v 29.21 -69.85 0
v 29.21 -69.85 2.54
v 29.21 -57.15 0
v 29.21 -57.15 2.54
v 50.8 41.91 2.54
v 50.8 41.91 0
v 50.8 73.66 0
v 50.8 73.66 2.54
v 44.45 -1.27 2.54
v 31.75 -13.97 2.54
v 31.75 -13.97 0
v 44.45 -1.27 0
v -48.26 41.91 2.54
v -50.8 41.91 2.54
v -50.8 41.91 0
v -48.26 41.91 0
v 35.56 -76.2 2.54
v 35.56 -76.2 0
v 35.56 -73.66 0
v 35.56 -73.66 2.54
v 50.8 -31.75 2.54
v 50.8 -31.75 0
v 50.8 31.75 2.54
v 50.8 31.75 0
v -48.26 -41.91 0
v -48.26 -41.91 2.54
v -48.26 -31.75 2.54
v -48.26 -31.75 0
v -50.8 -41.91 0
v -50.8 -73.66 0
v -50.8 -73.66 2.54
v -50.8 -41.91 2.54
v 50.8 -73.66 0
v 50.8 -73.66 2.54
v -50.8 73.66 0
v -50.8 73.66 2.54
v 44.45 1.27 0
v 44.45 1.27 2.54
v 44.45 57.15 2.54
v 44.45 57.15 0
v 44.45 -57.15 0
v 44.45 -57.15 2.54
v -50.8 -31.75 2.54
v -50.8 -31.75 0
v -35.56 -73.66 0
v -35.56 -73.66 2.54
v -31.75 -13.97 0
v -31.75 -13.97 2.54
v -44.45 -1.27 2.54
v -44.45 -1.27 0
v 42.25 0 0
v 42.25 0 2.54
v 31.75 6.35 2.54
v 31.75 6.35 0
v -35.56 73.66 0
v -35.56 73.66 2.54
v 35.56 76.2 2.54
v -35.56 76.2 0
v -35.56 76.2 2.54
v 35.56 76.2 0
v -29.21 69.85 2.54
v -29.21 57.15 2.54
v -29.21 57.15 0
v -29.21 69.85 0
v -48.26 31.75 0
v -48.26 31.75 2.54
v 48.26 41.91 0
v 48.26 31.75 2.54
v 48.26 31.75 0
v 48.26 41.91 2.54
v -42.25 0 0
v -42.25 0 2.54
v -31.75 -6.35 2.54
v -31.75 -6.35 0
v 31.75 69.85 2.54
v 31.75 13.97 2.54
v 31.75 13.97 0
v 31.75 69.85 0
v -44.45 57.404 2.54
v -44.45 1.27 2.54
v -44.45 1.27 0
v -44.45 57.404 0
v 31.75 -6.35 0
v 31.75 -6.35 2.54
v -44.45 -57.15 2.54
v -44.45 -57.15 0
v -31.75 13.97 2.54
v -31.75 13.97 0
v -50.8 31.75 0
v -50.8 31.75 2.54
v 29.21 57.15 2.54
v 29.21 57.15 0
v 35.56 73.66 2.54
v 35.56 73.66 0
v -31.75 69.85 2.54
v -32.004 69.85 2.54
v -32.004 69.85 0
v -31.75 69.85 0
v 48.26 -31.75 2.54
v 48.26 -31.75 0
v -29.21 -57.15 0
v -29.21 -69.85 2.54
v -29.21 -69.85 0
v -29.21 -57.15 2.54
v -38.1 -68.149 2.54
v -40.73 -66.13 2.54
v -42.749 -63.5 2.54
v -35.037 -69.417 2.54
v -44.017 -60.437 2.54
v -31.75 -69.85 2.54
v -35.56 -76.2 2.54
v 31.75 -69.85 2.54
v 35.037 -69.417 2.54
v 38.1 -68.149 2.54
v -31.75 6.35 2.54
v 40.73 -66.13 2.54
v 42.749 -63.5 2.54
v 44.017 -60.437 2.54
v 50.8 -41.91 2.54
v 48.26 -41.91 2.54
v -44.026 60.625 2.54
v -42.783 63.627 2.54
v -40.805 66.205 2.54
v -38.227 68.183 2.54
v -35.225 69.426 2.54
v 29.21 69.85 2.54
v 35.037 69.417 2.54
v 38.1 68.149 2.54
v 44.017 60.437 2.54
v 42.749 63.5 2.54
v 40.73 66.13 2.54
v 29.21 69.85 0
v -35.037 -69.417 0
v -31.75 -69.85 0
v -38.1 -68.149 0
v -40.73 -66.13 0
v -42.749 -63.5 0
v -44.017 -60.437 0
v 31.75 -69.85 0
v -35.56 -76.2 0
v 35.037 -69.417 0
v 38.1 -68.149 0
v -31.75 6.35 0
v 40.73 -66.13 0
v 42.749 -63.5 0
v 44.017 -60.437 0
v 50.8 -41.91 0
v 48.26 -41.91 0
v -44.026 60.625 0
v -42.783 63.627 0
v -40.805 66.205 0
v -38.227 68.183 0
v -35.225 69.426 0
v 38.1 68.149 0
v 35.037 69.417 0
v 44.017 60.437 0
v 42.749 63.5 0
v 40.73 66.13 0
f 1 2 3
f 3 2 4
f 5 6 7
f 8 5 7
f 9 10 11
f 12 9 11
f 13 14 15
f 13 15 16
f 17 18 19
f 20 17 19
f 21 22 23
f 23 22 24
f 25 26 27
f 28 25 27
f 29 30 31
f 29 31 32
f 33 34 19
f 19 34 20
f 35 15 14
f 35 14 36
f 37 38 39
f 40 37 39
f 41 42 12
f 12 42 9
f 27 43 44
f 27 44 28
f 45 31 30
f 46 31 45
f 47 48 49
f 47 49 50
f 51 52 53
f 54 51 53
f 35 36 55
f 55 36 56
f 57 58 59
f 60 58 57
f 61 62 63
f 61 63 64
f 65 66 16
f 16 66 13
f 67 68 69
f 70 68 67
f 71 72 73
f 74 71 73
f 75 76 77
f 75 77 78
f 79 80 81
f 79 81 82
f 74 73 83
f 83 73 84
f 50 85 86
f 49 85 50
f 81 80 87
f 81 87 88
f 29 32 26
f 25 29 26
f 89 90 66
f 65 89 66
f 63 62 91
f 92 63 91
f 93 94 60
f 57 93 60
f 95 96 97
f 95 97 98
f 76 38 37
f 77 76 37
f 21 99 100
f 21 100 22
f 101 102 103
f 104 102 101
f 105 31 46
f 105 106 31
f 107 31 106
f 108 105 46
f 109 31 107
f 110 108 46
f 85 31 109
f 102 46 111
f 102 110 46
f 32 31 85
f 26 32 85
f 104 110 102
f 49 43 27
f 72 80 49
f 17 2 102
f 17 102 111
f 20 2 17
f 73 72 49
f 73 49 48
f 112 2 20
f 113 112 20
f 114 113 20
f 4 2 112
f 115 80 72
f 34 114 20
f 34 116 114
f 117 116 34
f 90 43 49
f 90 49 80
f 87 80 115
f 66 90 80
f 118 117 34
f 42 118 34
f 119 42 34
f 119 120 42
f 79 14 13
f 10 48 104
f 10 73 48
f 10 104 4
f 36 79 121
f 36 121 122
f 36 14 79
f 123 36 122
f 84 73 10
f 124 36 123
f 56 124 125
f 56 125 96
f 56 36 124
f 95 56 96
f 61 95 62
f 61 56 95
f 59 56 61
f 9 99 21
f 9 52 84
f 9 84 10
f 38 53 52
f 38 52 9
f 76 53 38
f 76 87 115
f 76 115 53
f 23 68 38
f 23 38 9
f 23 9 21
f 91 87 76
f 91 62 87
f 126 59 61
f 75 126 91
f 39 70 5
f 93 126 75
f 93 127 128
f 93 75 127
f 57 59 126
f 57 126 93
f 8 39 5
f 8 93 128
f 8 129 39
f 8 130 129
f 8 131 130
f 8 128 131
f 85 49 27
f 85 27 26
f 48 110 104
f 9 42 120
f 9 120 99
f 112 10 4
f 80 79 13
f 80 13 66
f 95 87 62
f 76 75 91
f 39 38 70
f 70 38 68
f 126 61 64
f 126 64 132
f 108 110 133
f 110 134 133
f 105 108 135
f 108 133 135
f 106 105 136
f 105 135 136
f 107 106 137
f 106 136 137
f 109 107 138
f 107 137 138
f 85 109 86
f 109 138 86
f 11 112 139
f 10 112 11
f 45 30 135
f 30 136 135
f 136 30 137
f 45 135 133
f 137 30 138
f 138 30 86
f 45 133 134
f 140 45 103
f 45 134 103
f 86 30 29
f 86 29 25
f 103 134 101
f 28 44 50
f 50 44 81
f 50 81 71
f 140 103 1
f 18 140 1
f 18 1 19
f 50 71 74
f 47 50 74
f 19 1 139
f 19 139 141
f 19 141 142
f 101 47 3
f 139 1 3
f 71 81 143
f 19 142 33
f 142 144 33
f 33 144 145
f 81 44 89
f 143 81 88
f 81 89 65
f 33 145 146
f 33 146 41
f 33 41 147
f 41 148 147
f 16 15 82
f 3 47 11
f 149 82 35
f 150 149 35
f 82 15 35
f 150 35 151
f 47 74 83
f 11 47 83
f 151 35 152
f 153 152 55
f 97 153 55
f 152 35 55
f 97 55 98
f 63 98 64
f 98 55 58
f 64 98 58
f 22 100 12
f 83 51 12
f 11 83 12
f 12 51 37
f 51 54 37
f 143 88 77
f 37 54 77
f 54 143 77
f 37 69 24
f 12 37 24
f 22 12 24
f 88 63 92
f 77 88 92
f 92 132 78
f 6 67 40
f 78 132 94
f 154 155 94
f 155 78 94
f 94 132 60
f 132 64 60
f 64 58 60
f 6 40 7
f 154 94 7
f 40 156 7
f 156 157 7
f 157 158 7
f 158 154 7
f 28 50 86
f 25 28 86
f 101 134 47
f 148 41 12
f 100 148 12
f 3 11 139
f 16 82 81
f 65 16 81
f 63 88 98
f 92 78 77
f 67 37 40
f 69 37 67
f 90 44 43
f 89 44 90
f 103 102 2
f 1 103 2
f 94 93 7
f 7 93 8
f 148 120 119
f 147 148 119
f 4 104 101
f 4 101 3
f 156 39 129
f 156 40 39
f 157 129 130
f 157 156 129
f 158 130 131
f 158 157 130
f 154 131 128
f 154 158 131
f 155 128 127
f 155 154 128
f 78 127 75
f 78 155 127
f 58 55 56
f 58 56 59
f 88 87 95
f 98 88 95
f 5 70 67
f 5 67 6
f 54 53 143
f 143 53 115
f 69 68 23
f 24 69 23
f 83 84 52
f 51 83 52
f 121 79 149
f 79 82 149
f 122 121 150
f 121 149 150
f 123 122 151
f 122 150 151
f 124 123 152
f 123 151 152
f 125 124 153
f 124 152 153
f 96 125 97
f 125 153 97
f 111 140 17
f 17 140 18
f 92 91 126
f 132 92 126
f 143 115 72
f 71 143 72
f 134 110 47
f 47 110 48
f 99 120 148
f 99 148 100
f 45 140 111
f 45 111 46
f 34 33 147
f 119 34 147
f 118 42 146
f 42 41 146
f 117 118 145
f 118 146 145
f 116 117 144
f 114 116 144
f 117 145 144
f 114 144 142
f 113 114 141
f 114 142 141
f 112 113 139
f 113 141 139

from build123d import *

# Parameters (mm, degrees)
F0_W      = 101.6
F0_H      = 152.4
F1_DEPTH  = 2.54
F2_W      = 12.7
F2_H      = 68.58
F3_DEPTH  = 2.541
F4_SIZE2  = 12.69999
F4_SIZE   = 12.69999
F5_R      = 12.446
F6_W      = 58.42
F6_H      = 12.7
F7_DEPTH  = 2.541
F8_W      = 12.7
F8_H      = 68.58
F9_DEPTH  = 2.541
F10_R     = 12.69999
F11_SIZE2 = 12.69999
F11_SIZE  = 12.69999
F12_W     = 12.7
F12_H     = 68.58
F13_DEPTH = 2.541
F14_SIZE2 = 12.69999
F14_SIZE  = 12.69999
F15_R     = 12.69999
F16_W     = 12.7
F16_H     = 68.58
F17_DEPTH = 2.541
F18_SIZE2 = 12.69999
F18_SIZE  = 12.69999
F19_R     = 12.69999
F20_W     = 58.42
F20_H     = 12.7
F21_DEPTH = 2.541
F23_DEPTH = 25.4
F25_DEPTH = 25.4
F27_DEPTH = 25.4
F28_W     = 2.54
F28_H     = 10.16
F29_DEPTH = 25.4
F30_W     = 2.54
F30_H     = 10.16
F31_DEPTH = 25.4
F32_W     = 15.24
F32_H     = 2.54
F33_DEPTH = 25.4


# Not quite as in the source:
# - a fillet or chamfer is up to 0.001 mm smaller than in the source, because OpenCascade refuses the exact size


with BuildPart() as f1:
    # F0 (on Top) → F1 (new body)
    with BuildSketch(Plane.XY):
        Rectangle(F0_W, F0_H)
    extrude(amount=F1_DEPTH)

    # F2 (on face) → F3 (cut, through all)
    with BuildSketch(Plane.XY.offset(2.54)):
        with Locations((-38.1, 35.56)):
            Rectangle(F2_W, F2_H)
    extrude(amount=-F3_DEPTH, mode=Mode.SUBTRACT)

    # F4 (size 12.7 and 12.7 in the source; OpenCascade refuses exactly that, so slightly less here)
    f4_edges = [f1.edges().sort_by_distance(p)[0] for p in [
        (-31.75, 1.27, 1.27),
    ]]
    chamfer(f4_edges, length=F4_SIZE, length2=F4_SIZE2)

    # F5
    f5_edges = [f1.edges().sort_by_distance(p)[0] for p in [
        (-44.45, 69.85, 1.27),
    ]]
    fillet(f5_edges, radius=F5_R)

    # F6 (on face) → F7 (cut, through all)
    with BuildSketch(Plane.XY.offset(2.54)):
        with Locations((0, 63.5)):
            Rectangle(F6_W, F6_H)
    extrude(amount=-F7_DEPTH, mode=Mode.SUBTRACT)

    # F8 (on face) → F9 (cut, through all)
    with BuildSketch(Plane.XY.offset(2.54)):
        with Locations((38.1, 35.56)):
            Rectangle(F8_W, F8_H)
    extrude(amount=-F9_DEPTH, mode=Mode.SUBTRACT)

    # F10 (radius 12.7 in the source; OpenCascade refuses exactly that, so slightly less here)
    f10_edges = [f1.edges().sort_by_distance(p)[0] for p in [
        (44.45, 69.85, 1.27),
    ]]
    fillet(f10_edges, radius=F10_R)

    # F11 (size 12.7 and 12.7 in the source; OpenCascade refuses exactly that, so slightly less here)
    f11_edges = [f1.edges().sort_by_distance(p)[0] for p in [
        (31.75, 1.27, 1.27),
    ]]
    chamfer(f11_edges, length=F11_SIZE, length2=F11_SIZE2)

    # F12 (on face) → F13 (cut, through all)
    with BuildSketch(Plane.XY.offset(2.54)):
        with Locations((-38.1, -35.56)):
            Rectangle(F12_W, F12_H)
    extrude(amount=-F13_DEPTH, mode=Mode.SUBTRACT)

    # F14 (size 12.7 and 12.7 in the source; OpenCascade refuses exactly that, so slightly less here)
    f14_edges = [f1.edges().sort_by_distance(p)[0] for p in [
        (-31.75, -1.27, 1.27),
    ]]
    chamfer(f14_edges, length=F14_SIZE, length2=F14_SIZE2)

    # F15 (radius 12.7 in the source; OpenCascade refuses exactly that, so slightly less here)
    f15_edges = [f1.edges().sort_by_distance(p)[0] for p in [
        (-44.45, -69.85, 1.27),
    ]]
    fillet(f15_edges, radius=F15_R)

    # F16 (on face) → F17 (cut, through all)
    with BuildSketch(Plane.XY.offset(2.54)):
        with Locations((38.1, -35.56)):
            Rectangle(F16_W, F16_H)
    extrude(amount=-F17_DEPTH, mode=Mode.SUBTRACT)

    # F18 (size 12.7 and 12.7 in the source; OpenCascade refuses exactly that, so slightly less here)
    f18_edges = [f1.edges().sort_by_distance(p)[0] for p in [
        (31.75, -1.27, 1.27),
    ]]
    chamfer(f18_edges, length=F18_SIZE, length2=F18_SIZE2)

    # F19 (radius 12.7 in the source; OpenCascade refuses exactly that, so slightly less here)
    f19_edges = [f1.edges().sort_by_distance(p)[0] for p in [
        (44.45, -69.85, 1.27),
    ]]
    fillet(f19_edges, radius=F19_R)

    # F20 (on face) → F21 (cut, through all)
    with BuildSketch(Plane.XY.offset(2.54)):
        with Locations((0, -63.5)):
            Rectangle(F20_W, F20_H)
    extrude(amount=-F21_DEPTH, mode=Mode.SUBTRACT)

    # F22 (on face) → F23 (cut)
    with BuildSketch(Plane.XY.offset(2.54)):
        Polygon((-31.75, 6.35), (-42.2502954744, 0), (-31.75, -6.35), (31.75, -6.35), (42.2502954744, 0), (31.75, 6.35), align=None)
    extrude(amount=-F23_DEPTH, mode=Mode.SUBTRACT)

    # F24 (on face) → F25 (cut)
    with BuildSketch(Plane.XY.offset(2.54)):
        Polygon((-50.8, -76.2), (-39.37, -76.2), (-41.91, -73.66), (-50.8, -73.66), align=None)
        Polygon((41.91, -73.66), (39.37, -76.2), (50.8, -76.2), (50.8, -73.66), align=None)
    extrude(amount=-F25_DEPTH, mode=Mode.SUBTRACT)

    # F26 (on face) → F27 (cut)
    with BuildSketch(Plane.XY.offset(2.54)):
        Polygon((-39.37, 76.2), (-50.8, 76.2), (-50.8, 73.66), (-41.91, 73.66), align=None)
        Polygon((50.8, 76.2), (39.37, 76.2), (41.91, 73.66), (50.8, 73.66), align=None)
    extrude(amount=-F27_DEPTH, mode=Mode.SUBTRACT)

    # F28 (on face) → F29 (cut)
    with BuildSketch(Plane.XY.offset(2.54)):
        with Locations((49.53, 36.83)):
            Rectangle(F28_W, F28_H)
        with Locations((49.53, -36.83)):
            Rectangle(F28_W, F28_H)
    extrude(amount=-F29_DEPTH, mode=Mode.SUBTRACT)

    # F30 (on face) → F31 (cut)
    with BuildSketch(Plane.XY.offset(2.54)):
        with Locations((-49.53, 36.83)):
            Rectangle(F30_W, F30_H)
        with Locations((-49.53, -36.83)):
            Rectangle(F30_W, F30_H)
    extrude(amount=-F31_DEPTH, mode=Mode.SUBTRACT)

    # F32 (on face) → F33 (cut)
    with BuildSketch(Plane.XY.offset(2.54)):
        with Locations((-43.18, -74.93)):
            Rectangle(F32_W, F32_H)
        with Locations((43.18, -74.93)):
            Rectangle(F32_W, F32_H)
        with Locations((-43.18, 74.93)):
            Rectangle(F32_W, F32_H)
        with Locations((43.18, 74.93)):
            Rectangle(F32_W, F32_H)
    extrude(amount=-F33_DEPTH, mode=Mode.SUBTRACT)


solid = f1.part
